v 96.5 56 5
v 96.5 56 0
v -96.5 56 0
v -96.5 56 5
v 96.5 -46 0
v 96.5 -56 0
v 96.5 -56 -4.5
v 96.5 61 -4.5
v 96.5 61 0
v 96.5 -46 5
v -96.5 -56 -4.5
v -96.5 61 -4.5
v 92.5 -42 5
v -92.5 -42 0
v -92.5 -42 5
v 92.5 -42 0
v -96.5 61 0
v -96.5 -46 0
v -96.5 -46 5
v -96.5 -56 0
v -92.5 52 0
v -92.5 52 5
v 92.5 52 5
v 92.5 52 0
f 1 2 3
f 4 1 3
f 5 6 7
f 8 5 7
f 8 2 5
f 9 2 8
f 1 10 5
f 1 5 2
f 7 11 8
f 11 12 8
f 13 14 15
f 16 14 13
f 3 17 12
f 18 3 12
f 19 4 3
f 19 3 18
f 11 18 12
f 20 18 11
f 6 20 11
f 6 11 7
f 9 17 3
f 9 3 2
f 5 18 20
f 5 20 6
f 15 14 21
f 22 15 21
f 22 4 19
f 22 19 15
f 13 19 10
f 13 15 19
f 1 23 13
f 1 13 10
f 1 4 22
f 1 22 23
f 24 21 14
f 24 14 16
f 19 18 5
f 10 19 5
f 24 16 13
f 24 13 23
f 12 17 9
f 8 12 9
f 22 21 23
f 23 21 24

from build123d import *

# Parameters (mm, degrees)
F0_W     = 185
F0_H     = 94
F0_W_2   = 193
F0_H_2   = 10
F0_H_3   = 5
F1_DEPTH = 4.5
F2_DEPTH = 5


# Not quite as in the source:
# - a feature names something its author has since deleted; it is built from what else it names


with BuildPart() as f1:
    # F0 (on Top) → F1 (new body)
    with BuildSketch(Plane.XY):
        Polygon((96.5, 52), (96.5, 56), (-96.5, 56), (-96.5, 52), (-96.5, -42), (-96.5, -46), (96.5, -46), (96.5, -42), align=None)
        with Locations((0, 5)):
            Rectangle(F0_W, F0_H, mode=Mode.SUBTRACT)
        with Locations((0, 5)):
            Rectangle(F0_W, F0_H)
        with Locations((0, -51)):
            Rectangle(F0_W_2, F0_H_2)
        with Locations((0, 58.5)):
            Rectangle(F0_W_2, F0_H_3)
    extrude(amount=-F1_DEPTH)

    # F0 (on Top) → F2 (join)
    with BuildSketch(Plane.XY):
        Polygon((96.5, 52), (96.5, 56), (-96.5, 56), (-96.5, 52), (-96.5, -42), (-96.5, -46), (96.5, -46), (96.5, -42), align=None)
        with Locations((0, 5)):
            Rectangle(F0_W, F0_H, mode=Mode.SUBTRACT)
    extrude(amount=F2_DEPTH)


solid = f1.part
